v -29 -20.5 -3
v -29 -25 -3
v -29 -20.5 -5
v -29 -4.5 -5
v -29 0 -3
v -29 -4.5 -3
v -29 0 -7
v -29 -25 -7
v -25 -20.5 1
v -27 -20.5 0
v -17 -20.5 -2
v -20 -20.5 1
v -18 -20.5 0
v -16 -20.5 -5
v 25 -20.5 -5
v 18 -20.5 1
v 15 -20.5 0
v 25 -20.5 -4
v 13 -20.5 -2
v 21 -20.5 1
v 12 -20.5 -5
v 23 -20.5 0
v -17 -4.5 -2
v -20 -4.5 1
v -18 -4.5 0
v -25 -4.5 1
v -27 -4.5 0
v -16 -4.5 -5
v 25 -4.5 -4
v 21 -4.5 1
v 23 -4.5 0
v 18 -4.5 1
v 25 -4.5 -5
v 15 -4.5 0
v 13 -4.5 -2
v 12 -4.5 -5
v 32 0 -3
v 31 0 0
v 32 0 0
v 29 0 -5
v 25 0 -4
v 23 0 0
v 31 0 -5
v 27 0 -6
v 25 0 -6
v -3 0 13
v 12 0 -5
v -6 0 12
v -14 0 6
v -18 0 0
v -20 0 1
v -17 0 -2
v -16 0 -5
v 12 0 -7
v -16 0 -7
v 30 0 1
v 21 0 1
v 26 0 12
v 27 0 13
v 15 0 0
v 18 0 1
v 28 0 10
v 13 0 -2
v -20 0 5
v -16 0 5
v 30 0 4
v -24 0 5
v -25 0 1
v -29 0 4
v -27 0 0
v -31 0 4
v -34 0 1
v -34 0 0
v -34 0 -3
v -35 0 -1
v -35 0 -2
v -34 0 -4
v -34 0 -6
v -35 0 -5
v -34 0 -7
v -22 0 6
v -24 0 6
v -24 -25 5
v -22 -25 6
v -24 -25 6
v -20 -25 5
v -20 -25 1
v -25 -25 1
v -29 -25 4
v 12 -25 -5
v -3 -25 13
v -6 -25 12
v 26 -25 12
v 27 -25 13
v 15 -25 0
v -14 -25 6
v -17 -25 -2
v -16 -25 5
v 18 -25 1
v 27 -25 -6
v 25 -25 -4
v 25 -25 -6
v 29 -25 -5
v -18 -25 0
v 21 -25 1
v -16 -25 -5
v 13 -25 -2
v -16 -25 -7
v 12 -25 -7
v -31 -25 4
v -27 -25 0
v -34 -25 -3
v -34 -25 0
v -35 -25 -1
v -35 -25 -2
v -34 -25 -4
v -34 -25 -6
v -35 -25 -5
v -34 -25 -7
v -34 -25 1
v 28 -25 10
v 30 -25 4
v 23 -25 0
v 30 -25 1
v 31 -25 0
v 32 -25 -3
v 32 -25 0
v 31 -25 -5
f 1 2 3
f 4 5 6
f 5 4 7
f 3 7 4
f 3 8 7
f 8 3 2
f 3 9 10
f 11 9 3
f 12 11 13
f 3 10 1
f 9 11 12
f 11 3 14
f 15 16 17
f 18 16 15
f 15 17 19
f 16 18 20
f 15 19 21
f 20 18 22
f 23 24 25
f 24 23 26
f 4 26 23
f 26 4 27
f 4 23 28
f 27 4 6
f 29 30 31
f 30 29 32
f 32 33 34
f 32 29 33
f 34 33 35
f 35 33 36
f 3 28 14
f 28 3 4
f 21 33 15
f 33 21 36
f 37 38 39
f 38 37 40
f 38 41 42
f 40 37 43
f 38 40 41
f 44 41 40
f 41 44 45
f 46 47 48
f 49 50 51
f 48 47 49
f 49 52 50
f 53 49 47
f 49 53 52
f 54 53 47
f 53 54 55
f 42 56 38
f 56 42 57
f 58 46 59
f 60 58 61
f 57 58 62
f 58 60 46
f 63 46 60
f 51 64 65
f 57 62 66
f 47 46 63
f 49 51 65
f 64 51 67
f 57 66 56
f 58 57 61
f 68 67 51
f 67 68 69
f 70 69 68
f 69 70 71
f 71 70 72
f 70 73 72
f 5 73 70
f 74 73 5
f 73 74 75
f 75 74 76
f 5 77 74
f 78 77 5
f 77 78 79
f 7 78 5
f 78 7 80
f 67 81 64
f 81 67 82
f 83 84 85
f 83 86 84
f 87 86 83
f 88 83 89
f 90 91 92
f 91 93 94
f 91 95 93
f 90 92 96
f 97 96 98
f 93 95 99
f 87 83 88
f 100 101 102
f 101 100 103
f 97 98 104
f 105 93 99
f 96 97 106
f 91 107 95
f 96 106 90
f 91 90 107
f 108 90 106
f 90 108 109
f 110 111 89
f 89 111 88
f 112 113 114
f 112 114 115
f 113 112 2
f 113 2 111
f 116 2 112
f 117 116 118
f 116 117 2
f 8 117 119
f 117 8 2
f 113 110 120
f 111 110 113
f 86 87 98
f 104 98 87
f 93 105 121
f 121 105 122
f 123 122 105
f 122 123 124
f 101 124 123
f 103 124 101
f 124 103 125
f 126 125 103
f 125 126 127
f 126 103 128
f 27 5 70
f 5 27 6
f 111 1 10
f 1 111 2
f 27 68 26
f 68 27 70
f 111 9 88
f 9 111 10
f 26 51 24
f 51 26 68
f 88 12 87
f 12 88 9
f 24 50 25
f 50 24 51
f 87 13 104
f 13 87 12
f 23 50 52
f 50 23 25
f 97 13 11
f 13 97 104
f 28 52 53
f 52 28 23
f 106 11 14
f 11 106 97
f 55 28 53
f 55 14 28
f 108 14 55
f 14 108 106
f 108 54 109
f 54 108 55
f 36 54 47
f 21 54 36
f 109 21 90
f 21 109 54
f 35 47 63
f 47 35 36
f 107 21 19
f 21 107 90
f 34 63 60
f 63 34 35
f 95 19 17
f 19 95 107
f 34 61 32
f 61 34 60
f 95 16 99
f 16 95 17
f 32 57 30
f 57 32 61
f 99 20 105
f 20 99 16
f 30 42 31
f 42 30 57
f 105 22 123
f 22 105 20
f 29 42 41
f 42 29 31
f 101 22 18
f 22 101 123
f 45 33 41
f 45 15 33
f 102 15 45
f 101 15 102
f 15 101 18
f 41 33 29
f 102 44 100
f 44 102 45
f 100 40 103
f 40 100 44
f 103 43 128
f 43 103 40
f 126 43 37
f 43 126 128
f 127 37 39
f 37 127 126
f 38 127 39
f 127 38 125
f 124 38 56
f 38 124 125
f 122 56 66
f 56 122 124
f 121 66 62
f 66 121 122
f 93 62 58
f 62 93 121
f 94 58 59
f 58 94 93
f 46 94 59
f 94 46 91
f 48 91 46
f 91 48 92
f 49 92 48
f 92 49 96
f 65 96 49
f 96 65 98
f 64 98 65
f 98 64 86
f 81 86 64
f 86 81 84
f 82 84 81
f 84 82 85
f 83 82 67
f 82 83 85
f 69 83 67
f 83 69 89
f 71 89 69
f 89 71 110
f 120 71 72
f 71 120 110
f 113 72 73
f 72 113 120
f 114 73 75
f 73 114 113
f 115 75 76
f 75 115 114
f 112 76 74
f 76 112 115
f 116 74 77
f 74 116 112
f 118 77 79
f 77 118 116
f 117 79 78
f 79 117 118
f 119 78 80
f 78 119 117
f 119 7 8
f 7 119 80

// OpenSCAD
//start
module  Foz() 
{ 
color  ([0.8,0.2,0.6]) 
{ 
            polygon(points = [
[-34.00,-6.00]
,[-35.00,-5.00]
,[-34.00,-4.00]
,[-34.00,-3.00]
,[-35.00,-2.00]
,[-35.00,-1.00]
,[-34.00,0.00]
,[-34.00,1.00]
,[-33.00,2.00]
,[-32.00,3.00]
,[-31.00,4.00]
,[-29.00,4.00]
,[-24.00,5.00]
,[-24.00,6.00]
,[-23.00,6.00]
,[-22.00,6.00]
,[-20.00,5.00]
,[-16.00,5.00]
,[-14.00,6.00]
,[-6.00,12.00]
,[-3.00,13.00]
,[24.00,13.00]
,[27.00,13.00]
,[26.00,12.00]
,[28.00,10.00]
,[29.00,7.00]
,[30.00,4.00]
,[30.00,1.00]
,[31.00,0.00]
,[32.00,0.00]
,[32.00,-3.00]
,[31.00,-5.00]
,[29.00,-5.00]
,[27.00,-6.00]
,[25.00,-6.00]
,[25.00,-4.00]
,[24.00,-2.00]
,[23.00,0.00]
,[21.00,1.00]
,[18.00,1.00]
,[15.00,0.00]
,[13.00,-2.00]
,[12.00,-5.00]
,[12.00,-7.00]
,[-16.00,-7.00]
,[-16.00,-5.00]
,[-17.00,-2.00]
,[-18.00,0.00]
,[-20.00,1.00]
,[-21.00,1.00]
,[-25.00,1.00]
,[-27.00,0.00]
,[-29.00,-3.00]
,[-29.00,-6.00]
,[-29.00,-7.00]
,[-34.00,-7.00]
]
,paths = [
[0,1,2,3,4,5,6,7,8,9,10,11,12,13,14,15,16,17,18,19,20,21,22,23,24,25,26,27,28,29,30,31,32,33,34,35,36,37,38,39,40,41,42,43,44,45,46,47,48,49,50,51,52,53,54,55]]
            );
}
}
rotate([90,0,0]) color("black") translate([-29,-5,4.5]) cube([55,8,16]);
rotate([90,0,0]) color("blue") linear_extrude(height = 25) Foz(center=true);
